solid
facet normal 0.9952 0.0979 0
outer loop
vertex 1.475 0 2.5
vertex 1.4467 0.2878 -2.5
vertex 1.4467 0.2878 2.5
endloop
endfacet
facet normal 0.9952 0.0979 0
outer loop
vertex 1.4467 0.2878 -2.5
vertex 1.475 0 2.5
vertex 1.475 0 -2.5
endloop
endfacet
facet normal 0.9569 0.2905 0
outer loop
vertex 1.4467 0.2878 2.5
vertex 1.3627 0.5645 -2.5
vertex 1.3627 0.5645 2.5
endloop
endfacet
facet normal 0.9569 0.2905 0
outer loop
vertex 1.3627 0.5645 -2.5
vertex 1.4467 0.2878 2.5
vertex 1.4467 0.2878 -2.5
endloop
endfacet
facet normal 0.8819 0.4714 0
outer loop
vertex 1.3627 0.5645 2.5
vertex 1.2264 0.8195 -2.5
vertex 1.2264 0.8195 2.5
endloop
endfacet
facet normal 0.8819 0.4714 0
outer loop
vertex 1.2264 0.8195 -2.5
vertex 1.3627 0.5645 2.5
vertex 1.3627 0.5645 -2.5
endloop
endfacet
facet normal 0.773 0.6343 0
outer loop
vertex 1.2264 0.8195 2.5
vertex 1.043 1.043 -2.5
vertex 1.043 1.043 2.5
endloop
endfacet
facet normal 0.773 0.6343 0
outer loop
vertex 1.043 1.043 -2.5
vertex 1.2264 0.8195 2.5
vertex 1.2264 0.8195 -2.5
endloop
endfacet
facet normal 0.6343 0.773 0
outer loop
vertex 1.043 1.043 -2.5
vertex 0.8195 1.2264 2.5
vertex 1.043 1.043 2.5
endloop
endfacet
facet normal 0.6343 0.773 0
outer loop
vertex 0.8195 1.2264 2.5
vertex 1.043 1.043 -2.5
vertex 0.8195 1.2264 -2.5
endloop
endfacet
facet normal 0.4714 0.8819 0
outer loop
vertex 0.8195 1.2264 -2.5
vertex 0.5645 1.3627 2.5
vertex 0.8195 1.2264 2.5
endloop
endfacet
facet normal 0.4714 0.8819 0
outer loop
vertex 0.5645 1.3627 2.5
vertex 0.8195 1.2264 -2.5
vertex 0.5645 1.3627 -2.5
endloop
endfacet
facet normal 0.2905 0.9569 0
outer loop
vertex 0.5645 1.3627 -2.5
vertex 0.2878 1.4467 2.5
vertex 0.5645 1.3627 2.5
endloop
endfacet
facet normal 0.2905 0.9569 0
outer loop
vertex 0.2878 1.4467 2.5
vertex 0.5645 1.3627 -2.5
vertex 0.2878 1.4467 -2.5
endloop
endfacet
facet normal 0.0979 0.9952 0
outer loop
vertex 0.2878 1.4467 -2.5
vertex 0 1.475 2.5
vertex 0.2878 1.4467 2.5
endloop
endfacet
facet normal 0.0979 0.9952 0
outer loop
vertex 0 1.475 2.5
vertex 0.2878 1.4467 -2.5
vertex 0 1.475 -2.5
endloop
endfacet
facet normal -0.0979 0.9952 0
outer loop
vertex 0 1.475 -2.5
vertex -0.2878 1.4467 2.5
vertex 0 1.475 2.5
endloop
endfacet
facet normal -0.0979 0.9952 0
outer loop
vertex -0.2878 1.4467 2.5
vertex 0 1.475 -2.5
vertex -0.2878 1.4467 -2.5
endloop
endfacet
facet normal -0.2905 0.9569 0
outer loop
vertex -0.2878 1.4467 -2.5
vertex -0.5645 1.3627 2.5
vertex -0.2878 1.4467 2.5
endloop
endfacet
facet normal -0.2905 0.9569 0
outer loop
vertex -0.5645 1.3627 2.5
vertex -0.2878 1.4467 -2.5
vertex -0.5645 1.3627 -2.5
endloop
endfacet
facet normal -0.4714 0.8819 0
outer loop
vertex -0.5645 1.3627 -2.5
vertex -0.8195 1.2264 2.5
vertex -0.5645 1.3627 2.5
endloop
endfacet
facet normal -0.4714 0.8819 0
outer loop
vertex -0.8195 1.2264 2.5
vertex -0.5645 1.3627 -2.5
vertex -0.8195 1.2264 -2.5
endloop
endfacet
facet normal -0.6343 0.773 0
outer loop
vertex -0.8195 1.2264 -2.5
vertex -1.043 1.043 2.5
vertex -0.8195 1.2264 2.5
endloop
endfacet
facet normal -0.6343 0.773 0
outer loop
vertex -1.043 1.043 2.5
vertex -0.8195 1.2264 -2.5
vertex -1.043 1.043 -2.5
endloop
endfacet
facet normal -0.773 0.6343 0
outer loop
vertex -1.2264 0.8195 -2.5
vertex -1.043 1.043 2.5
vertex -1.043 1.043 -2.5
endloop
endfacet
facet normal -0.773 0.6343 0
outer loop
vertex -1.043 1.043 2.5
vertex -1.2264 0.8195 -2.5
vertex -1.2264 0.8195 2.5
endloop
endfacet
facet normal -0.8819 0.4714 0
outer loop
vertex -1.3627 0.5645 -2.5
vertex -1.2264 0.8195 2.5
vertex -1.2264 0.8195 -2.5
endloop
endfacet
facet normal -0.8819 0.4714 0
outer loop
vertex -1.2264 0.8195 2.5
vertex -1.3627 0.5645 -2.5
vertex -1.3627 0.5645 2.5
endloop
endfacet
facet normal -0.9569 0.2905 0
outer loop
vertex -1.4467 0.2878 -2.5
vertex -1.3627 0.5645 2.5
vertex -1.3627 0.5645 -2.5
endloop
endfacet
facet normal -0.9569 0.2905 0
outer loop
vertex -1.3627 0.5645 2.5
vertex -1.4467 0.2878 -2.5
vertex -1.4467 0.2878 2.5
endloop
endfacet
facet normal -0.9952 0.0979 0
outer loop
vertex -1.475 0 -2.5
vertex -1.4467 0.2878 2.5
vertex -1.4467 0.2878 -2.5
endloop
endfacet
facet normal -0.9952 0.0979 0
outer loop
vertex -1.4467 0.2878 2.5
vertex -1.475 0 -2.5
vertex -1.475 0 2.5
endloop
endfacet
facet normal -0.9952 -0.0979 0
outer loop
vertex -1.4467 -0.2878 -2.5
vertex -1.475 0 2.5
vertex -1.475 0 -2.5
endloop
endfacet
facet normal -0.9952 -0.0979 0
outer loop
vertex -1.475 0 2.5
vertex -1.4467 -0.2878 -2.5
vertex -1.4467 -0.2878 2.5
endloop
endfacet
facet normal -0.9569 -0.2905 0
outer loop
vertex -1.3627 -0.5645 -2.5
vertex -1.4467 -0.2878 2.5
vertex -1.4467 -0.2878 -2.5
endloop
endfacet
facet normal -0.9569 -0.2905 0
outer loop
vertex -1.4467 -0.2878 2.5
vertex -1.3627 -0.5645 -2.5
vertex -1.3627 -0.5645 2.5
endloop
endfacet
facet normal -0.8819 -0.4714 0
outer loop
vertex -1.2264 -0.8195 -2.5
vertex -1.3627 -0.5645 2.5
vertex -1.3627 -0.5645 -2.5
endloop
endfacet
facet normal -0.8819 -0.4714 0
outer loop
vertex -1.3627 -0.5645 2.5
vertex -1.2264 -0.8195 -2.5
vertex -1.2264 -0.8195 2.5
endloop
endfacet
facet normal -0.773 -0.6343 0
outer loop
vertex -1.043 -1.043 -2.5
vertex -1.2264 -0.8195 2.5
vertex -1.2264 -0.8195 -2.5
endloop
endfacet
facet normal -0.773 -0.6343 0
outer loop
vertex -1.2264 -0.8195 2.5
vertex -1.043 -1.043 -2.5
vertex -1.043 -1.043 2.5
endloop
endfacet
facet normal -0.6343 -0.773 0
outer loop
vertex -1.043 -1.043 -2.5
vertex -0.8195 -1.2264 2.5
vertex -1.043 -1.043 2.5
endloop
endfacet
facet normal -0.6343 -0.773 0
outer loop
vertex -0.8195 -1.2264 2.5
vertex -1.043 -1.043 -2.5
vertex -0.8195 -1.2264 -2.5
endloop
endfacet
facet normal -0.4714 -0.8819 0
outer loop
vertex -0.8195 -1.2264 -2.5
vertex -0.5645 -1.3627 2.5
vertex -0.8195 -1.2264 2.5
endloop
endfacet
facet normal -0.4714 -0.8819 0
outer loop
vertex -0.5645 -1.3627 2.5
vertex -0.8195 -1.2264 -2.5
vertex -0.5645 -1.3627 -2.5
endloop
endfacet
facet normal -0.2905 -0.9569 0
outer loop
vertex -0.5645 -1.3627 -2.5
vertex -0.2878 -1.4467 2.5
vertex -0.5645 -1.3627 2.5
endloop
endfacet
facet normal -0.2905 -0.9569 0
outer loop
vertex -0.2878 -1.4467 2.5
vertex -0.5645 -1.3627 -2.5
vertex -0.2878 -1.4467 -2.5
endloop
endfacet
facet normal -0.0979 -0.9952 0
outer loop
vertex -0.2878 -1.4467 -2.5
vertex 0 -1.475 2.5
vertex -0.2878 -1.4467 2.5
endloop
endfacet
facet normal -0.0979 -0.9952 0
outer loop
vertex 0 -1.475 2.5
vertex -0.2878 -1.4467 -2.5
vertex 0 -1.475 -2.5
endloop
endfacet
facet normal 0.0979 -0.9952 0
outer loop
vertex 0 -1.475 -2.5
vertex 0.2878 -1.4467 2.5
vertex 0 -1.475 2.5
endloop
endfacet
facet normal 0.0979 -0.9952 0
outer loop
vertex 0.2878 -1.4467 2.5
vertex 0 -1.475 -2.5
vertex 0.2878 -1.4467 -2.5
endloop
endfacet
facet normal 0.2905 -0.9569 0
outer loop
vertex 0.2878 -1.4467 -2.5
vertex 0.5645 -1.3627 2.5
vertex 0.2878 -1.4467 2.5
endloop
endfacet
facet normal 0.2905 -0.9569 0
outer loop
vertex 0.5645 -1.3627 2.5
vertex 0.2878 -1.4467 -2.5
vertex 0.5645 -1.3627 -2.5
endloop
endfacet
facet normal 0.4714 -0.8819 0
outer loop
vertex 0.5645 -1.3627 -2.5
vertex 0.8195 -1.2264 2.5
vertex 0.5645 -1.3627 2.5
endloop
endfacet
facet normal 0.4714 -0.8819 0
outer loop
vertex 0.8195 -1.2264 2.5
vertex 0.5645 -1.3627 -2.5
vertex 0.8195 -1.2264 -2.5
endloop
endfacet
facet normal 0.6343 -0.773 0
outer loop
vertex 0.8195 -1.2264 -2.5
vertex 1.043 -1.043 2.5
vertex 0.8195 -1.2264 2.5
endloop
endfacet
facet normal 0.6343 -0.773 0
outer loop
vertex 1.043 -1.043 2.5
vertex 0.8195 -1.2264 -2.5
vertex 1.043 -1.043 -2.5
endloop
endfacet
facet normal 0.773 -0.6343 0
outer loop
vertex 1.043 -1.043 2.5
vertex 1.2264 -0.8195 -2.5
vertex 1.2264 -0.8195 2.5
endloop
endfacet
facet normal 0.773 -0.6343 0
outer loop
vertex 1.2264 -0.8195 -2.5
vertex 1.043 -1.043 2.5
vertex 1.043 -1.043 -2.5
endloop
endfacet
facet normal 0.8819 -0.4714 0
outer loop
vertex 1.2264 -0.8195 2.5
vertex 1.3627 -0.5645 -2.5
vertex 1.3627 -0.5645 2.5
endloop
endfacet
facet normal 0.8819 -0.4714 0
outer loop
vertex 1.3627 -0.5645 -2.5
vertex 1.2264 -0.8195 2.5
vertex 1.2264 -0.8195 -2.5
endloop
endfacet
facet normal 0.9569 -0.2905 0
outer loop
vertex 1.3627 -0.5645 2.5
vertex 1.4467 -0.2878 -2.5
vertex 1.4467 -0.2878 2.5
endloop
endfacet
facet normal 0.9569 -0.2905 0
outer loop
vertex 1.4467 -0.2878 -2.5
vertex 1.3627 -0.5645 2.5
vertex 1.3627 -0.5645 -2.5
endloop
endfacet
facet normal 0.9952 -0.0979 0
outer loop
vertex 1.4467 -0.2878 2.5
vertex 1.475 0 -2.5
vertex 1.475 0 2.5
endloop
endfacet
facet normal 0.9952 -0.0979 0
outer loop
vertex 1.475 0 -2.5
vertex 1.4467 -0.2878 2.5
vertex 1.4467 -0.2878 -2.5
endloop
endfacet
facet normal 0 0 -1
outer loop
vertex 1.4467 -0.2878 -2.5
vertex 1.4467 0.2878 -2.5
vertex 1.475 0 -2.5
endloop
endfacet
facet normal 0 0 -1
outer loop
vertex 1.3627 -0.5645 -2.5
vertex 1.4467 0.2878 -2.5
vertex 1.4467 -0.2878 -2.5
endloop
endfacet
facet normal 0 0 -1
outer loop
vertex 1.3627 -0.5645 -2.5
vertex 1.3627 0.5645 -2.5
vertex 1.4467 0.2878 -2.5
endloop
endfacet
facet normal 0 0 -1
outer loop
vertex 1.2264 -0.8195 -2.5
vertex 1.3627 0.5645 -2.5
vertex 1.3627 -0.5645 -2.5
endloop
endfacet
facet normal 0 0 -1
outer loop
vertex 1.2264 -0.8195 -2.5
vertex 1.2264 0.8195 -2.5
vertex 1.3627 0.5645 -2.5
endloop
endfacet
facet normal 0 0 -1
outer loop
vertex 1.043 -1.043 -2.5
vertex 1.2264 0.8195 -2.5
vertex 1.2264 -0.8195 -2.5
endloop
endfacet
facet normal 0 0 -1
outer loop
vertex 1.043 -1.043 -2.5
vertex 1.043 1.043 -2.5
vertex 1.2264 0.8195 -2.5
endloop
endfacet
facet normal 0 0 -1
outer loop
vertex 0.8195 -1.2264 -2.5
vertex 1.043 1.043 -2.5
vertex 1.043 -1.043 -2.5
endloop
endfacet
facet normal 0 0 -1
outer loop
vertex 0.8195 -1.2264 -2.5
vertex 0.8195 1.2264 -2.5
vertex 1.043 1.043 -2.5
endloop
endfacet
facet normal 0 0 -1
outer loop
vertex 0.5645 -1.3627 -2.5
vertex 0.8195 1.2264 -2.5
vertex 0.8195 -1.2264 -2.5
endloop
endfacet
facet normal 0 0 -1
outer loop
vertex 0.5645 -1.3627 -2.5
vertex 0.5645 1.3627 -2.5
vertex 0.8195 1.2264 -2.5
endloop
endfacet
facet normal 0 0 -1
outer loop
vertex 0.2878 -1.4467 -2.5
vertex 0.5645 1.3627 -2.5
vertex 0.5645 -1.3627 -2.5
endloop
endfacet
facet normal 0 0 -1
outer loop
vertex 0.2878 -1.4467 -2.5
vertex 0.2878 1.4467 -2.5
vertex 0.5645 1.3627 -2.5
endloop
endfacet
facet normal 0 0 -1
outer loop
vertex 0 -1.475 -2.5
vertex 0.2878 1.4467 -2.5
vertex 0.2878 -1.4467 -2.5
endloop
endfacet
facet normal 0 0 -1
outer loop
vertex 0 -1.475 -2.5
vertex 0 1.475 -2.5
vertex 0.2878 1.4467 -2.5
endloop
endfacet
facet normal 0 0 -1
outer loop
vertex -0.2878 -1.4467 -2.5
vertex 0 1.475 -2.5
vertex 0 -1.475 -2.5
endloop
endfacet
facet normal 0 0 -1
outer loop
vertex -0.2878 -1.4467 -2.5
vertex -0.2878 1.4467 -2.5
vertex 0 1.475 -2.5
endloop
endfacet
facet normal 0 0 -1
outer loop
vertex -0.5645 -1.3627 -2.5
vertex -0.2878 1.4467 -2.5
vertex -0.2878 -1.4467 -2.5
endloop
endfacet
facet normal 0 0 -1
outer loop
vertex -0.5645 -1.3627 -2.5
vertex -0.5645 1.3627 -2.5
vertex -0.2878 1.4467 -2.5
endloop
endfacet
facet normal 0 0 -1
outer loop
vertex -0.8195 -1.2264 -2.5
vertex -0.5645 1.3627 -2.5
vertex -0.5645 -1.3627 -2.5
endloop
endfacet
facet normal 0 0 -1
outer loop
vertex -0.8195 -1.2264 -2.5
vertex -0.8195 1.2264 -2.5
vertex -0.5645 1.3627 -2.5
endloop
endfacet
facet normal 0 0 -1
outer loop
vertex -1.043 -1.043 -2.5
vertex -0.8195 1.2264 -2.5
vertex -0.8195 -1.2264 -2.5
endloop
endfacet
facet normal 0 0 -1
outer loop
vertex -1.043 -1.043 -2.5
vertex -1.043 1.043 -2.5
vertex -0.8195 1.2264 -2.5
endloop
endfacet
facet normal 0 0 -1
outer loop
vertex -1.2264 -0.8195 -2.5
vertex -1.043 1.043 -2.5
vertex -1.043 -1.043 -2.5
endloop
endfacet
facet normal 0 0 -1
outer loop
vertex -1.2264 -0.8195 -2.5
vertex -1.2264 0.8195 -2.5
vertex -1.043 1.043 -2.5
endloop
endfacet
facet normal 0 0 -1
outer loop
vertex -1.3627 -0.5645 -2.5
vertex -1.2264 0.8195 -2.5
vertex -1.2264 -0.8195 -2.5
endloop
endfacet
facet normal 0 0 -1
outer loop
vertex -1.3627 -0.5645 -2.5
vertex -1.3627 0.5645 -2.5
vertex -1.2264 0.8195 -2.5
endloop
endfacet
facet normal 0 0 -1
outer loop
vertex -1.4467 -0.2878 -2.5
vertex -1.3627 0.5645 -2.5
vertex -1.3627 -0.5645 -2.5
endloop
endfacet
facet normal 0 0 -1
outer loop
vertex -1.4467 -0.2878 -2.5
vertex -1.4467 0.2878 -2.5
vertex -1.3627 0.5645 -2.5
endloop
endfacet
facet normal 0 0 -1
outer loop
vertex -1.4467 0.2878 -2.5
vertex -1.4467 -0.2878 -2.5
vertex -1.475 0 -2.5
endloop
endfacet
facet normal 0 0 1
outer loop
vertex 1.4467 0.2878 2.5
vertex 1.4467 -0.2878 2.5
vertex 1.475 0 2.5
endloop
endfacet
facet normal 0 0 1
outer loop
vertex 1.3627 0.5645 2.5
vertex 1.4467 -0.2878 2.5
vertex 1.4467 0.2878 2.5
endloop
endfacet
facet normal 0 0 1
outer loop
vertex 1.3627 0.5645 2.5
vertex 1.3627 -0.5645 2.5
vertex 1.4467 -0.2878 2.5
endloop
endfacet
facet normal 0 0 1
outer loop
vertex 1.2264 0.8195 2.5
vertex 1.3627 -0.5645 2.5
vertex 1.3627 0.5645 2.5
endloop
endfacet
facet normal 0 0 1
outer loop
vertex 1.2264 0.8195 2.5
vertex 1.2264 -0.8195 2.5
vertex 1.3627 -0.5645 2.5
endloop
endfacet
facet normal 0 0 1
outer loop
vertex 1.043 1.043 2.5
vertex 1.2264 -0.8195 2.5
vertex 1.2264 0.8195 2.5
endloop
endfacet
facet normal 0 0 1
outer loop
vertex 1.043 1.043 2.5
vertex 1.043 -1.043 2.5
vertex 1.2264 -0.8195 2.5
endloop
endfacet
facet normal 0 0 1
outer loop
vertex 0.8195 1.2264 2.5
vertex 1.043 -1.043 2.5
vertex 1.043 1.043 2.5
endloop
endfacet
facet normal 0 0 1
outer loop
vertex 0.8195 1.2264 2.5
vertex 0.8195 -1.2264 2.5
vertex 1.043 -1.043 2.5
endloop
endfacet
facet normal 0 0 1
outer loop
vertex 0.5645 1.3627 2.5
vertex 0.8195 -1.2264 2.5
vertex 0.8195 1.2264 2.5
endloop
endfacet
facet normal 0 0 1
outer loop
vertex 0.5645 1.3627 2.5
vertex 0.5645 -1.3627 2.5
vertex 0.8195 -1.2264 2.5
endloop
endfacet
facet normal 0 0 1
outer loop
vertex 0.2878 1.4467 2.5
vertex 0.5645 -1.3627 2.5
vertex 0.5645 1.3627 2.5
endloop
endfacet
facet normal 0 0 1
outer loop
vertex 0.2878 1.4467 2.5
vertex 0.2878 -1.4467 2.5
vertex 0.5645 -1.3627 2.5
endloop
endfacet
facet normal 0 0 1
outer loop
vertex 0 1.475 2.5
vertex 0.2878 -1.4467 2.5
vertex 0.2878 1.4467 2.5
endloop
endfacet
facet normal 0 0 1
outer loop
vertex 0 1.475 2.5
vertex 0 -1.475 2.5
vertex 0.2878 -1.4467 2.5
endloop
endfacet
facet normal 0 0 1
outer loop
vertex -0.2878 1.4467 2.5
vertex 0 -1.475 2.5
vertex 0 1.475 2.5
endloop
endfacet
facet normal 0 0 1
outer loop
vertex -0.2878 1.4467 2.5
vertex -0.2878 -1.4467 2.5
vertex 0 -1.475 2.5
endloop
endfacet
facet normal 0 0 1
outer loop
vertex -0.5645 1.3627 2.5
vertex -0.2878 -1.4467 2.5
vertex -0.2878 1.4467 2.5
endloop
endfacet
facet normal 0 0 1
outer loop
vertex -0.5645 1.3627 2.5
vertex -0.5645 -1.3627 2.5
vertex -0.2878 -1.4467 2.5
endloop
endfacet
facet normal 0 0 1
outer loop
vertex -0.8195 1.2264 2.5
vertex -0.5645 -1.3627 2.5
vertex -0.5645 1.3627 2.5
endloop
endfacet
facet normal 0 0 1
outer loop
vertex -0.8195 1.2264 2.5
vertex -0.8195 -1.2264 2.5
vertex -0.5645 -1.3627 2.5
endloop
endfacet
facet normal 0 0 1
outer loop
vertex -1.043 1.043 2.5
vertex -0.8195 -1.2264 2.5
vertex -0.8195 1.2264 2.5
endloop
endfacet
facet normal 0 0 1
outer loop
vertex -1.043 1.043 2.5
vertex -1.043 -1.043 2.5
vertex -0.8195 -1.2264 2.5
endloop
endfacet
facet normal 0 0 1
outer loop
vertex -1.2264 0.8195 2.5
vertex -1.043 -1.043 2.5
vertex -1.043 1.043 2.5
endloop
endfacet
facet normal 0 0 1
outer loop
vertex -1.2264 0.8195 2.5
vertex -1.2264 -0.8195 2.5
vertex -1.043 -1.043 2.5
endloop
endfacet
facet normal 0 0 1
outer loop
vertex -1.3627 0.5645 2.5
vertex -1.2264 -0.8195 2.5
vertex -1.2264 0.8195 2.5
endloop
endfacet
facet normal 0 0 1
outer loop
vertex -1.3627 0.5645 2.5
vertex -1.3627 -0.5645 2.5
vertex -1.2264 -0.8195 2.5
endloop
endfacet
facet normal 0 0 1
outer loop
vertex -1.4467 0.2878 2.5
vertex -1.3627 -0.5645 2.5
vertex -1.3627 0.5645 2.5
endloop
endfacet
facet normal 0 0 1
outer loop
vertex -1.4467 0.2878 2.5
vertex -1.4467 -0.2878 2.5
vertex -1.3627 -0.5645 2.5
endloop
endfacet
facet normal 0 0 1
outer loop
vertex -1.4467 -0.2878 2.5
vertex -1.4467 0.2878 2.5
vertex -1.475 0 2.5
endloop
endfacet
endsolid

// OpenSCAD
// print in vase mode!

RES = undef;

$fn = RES ? RES : 32;

cylinder(d=2.95, h=5, center=true);
